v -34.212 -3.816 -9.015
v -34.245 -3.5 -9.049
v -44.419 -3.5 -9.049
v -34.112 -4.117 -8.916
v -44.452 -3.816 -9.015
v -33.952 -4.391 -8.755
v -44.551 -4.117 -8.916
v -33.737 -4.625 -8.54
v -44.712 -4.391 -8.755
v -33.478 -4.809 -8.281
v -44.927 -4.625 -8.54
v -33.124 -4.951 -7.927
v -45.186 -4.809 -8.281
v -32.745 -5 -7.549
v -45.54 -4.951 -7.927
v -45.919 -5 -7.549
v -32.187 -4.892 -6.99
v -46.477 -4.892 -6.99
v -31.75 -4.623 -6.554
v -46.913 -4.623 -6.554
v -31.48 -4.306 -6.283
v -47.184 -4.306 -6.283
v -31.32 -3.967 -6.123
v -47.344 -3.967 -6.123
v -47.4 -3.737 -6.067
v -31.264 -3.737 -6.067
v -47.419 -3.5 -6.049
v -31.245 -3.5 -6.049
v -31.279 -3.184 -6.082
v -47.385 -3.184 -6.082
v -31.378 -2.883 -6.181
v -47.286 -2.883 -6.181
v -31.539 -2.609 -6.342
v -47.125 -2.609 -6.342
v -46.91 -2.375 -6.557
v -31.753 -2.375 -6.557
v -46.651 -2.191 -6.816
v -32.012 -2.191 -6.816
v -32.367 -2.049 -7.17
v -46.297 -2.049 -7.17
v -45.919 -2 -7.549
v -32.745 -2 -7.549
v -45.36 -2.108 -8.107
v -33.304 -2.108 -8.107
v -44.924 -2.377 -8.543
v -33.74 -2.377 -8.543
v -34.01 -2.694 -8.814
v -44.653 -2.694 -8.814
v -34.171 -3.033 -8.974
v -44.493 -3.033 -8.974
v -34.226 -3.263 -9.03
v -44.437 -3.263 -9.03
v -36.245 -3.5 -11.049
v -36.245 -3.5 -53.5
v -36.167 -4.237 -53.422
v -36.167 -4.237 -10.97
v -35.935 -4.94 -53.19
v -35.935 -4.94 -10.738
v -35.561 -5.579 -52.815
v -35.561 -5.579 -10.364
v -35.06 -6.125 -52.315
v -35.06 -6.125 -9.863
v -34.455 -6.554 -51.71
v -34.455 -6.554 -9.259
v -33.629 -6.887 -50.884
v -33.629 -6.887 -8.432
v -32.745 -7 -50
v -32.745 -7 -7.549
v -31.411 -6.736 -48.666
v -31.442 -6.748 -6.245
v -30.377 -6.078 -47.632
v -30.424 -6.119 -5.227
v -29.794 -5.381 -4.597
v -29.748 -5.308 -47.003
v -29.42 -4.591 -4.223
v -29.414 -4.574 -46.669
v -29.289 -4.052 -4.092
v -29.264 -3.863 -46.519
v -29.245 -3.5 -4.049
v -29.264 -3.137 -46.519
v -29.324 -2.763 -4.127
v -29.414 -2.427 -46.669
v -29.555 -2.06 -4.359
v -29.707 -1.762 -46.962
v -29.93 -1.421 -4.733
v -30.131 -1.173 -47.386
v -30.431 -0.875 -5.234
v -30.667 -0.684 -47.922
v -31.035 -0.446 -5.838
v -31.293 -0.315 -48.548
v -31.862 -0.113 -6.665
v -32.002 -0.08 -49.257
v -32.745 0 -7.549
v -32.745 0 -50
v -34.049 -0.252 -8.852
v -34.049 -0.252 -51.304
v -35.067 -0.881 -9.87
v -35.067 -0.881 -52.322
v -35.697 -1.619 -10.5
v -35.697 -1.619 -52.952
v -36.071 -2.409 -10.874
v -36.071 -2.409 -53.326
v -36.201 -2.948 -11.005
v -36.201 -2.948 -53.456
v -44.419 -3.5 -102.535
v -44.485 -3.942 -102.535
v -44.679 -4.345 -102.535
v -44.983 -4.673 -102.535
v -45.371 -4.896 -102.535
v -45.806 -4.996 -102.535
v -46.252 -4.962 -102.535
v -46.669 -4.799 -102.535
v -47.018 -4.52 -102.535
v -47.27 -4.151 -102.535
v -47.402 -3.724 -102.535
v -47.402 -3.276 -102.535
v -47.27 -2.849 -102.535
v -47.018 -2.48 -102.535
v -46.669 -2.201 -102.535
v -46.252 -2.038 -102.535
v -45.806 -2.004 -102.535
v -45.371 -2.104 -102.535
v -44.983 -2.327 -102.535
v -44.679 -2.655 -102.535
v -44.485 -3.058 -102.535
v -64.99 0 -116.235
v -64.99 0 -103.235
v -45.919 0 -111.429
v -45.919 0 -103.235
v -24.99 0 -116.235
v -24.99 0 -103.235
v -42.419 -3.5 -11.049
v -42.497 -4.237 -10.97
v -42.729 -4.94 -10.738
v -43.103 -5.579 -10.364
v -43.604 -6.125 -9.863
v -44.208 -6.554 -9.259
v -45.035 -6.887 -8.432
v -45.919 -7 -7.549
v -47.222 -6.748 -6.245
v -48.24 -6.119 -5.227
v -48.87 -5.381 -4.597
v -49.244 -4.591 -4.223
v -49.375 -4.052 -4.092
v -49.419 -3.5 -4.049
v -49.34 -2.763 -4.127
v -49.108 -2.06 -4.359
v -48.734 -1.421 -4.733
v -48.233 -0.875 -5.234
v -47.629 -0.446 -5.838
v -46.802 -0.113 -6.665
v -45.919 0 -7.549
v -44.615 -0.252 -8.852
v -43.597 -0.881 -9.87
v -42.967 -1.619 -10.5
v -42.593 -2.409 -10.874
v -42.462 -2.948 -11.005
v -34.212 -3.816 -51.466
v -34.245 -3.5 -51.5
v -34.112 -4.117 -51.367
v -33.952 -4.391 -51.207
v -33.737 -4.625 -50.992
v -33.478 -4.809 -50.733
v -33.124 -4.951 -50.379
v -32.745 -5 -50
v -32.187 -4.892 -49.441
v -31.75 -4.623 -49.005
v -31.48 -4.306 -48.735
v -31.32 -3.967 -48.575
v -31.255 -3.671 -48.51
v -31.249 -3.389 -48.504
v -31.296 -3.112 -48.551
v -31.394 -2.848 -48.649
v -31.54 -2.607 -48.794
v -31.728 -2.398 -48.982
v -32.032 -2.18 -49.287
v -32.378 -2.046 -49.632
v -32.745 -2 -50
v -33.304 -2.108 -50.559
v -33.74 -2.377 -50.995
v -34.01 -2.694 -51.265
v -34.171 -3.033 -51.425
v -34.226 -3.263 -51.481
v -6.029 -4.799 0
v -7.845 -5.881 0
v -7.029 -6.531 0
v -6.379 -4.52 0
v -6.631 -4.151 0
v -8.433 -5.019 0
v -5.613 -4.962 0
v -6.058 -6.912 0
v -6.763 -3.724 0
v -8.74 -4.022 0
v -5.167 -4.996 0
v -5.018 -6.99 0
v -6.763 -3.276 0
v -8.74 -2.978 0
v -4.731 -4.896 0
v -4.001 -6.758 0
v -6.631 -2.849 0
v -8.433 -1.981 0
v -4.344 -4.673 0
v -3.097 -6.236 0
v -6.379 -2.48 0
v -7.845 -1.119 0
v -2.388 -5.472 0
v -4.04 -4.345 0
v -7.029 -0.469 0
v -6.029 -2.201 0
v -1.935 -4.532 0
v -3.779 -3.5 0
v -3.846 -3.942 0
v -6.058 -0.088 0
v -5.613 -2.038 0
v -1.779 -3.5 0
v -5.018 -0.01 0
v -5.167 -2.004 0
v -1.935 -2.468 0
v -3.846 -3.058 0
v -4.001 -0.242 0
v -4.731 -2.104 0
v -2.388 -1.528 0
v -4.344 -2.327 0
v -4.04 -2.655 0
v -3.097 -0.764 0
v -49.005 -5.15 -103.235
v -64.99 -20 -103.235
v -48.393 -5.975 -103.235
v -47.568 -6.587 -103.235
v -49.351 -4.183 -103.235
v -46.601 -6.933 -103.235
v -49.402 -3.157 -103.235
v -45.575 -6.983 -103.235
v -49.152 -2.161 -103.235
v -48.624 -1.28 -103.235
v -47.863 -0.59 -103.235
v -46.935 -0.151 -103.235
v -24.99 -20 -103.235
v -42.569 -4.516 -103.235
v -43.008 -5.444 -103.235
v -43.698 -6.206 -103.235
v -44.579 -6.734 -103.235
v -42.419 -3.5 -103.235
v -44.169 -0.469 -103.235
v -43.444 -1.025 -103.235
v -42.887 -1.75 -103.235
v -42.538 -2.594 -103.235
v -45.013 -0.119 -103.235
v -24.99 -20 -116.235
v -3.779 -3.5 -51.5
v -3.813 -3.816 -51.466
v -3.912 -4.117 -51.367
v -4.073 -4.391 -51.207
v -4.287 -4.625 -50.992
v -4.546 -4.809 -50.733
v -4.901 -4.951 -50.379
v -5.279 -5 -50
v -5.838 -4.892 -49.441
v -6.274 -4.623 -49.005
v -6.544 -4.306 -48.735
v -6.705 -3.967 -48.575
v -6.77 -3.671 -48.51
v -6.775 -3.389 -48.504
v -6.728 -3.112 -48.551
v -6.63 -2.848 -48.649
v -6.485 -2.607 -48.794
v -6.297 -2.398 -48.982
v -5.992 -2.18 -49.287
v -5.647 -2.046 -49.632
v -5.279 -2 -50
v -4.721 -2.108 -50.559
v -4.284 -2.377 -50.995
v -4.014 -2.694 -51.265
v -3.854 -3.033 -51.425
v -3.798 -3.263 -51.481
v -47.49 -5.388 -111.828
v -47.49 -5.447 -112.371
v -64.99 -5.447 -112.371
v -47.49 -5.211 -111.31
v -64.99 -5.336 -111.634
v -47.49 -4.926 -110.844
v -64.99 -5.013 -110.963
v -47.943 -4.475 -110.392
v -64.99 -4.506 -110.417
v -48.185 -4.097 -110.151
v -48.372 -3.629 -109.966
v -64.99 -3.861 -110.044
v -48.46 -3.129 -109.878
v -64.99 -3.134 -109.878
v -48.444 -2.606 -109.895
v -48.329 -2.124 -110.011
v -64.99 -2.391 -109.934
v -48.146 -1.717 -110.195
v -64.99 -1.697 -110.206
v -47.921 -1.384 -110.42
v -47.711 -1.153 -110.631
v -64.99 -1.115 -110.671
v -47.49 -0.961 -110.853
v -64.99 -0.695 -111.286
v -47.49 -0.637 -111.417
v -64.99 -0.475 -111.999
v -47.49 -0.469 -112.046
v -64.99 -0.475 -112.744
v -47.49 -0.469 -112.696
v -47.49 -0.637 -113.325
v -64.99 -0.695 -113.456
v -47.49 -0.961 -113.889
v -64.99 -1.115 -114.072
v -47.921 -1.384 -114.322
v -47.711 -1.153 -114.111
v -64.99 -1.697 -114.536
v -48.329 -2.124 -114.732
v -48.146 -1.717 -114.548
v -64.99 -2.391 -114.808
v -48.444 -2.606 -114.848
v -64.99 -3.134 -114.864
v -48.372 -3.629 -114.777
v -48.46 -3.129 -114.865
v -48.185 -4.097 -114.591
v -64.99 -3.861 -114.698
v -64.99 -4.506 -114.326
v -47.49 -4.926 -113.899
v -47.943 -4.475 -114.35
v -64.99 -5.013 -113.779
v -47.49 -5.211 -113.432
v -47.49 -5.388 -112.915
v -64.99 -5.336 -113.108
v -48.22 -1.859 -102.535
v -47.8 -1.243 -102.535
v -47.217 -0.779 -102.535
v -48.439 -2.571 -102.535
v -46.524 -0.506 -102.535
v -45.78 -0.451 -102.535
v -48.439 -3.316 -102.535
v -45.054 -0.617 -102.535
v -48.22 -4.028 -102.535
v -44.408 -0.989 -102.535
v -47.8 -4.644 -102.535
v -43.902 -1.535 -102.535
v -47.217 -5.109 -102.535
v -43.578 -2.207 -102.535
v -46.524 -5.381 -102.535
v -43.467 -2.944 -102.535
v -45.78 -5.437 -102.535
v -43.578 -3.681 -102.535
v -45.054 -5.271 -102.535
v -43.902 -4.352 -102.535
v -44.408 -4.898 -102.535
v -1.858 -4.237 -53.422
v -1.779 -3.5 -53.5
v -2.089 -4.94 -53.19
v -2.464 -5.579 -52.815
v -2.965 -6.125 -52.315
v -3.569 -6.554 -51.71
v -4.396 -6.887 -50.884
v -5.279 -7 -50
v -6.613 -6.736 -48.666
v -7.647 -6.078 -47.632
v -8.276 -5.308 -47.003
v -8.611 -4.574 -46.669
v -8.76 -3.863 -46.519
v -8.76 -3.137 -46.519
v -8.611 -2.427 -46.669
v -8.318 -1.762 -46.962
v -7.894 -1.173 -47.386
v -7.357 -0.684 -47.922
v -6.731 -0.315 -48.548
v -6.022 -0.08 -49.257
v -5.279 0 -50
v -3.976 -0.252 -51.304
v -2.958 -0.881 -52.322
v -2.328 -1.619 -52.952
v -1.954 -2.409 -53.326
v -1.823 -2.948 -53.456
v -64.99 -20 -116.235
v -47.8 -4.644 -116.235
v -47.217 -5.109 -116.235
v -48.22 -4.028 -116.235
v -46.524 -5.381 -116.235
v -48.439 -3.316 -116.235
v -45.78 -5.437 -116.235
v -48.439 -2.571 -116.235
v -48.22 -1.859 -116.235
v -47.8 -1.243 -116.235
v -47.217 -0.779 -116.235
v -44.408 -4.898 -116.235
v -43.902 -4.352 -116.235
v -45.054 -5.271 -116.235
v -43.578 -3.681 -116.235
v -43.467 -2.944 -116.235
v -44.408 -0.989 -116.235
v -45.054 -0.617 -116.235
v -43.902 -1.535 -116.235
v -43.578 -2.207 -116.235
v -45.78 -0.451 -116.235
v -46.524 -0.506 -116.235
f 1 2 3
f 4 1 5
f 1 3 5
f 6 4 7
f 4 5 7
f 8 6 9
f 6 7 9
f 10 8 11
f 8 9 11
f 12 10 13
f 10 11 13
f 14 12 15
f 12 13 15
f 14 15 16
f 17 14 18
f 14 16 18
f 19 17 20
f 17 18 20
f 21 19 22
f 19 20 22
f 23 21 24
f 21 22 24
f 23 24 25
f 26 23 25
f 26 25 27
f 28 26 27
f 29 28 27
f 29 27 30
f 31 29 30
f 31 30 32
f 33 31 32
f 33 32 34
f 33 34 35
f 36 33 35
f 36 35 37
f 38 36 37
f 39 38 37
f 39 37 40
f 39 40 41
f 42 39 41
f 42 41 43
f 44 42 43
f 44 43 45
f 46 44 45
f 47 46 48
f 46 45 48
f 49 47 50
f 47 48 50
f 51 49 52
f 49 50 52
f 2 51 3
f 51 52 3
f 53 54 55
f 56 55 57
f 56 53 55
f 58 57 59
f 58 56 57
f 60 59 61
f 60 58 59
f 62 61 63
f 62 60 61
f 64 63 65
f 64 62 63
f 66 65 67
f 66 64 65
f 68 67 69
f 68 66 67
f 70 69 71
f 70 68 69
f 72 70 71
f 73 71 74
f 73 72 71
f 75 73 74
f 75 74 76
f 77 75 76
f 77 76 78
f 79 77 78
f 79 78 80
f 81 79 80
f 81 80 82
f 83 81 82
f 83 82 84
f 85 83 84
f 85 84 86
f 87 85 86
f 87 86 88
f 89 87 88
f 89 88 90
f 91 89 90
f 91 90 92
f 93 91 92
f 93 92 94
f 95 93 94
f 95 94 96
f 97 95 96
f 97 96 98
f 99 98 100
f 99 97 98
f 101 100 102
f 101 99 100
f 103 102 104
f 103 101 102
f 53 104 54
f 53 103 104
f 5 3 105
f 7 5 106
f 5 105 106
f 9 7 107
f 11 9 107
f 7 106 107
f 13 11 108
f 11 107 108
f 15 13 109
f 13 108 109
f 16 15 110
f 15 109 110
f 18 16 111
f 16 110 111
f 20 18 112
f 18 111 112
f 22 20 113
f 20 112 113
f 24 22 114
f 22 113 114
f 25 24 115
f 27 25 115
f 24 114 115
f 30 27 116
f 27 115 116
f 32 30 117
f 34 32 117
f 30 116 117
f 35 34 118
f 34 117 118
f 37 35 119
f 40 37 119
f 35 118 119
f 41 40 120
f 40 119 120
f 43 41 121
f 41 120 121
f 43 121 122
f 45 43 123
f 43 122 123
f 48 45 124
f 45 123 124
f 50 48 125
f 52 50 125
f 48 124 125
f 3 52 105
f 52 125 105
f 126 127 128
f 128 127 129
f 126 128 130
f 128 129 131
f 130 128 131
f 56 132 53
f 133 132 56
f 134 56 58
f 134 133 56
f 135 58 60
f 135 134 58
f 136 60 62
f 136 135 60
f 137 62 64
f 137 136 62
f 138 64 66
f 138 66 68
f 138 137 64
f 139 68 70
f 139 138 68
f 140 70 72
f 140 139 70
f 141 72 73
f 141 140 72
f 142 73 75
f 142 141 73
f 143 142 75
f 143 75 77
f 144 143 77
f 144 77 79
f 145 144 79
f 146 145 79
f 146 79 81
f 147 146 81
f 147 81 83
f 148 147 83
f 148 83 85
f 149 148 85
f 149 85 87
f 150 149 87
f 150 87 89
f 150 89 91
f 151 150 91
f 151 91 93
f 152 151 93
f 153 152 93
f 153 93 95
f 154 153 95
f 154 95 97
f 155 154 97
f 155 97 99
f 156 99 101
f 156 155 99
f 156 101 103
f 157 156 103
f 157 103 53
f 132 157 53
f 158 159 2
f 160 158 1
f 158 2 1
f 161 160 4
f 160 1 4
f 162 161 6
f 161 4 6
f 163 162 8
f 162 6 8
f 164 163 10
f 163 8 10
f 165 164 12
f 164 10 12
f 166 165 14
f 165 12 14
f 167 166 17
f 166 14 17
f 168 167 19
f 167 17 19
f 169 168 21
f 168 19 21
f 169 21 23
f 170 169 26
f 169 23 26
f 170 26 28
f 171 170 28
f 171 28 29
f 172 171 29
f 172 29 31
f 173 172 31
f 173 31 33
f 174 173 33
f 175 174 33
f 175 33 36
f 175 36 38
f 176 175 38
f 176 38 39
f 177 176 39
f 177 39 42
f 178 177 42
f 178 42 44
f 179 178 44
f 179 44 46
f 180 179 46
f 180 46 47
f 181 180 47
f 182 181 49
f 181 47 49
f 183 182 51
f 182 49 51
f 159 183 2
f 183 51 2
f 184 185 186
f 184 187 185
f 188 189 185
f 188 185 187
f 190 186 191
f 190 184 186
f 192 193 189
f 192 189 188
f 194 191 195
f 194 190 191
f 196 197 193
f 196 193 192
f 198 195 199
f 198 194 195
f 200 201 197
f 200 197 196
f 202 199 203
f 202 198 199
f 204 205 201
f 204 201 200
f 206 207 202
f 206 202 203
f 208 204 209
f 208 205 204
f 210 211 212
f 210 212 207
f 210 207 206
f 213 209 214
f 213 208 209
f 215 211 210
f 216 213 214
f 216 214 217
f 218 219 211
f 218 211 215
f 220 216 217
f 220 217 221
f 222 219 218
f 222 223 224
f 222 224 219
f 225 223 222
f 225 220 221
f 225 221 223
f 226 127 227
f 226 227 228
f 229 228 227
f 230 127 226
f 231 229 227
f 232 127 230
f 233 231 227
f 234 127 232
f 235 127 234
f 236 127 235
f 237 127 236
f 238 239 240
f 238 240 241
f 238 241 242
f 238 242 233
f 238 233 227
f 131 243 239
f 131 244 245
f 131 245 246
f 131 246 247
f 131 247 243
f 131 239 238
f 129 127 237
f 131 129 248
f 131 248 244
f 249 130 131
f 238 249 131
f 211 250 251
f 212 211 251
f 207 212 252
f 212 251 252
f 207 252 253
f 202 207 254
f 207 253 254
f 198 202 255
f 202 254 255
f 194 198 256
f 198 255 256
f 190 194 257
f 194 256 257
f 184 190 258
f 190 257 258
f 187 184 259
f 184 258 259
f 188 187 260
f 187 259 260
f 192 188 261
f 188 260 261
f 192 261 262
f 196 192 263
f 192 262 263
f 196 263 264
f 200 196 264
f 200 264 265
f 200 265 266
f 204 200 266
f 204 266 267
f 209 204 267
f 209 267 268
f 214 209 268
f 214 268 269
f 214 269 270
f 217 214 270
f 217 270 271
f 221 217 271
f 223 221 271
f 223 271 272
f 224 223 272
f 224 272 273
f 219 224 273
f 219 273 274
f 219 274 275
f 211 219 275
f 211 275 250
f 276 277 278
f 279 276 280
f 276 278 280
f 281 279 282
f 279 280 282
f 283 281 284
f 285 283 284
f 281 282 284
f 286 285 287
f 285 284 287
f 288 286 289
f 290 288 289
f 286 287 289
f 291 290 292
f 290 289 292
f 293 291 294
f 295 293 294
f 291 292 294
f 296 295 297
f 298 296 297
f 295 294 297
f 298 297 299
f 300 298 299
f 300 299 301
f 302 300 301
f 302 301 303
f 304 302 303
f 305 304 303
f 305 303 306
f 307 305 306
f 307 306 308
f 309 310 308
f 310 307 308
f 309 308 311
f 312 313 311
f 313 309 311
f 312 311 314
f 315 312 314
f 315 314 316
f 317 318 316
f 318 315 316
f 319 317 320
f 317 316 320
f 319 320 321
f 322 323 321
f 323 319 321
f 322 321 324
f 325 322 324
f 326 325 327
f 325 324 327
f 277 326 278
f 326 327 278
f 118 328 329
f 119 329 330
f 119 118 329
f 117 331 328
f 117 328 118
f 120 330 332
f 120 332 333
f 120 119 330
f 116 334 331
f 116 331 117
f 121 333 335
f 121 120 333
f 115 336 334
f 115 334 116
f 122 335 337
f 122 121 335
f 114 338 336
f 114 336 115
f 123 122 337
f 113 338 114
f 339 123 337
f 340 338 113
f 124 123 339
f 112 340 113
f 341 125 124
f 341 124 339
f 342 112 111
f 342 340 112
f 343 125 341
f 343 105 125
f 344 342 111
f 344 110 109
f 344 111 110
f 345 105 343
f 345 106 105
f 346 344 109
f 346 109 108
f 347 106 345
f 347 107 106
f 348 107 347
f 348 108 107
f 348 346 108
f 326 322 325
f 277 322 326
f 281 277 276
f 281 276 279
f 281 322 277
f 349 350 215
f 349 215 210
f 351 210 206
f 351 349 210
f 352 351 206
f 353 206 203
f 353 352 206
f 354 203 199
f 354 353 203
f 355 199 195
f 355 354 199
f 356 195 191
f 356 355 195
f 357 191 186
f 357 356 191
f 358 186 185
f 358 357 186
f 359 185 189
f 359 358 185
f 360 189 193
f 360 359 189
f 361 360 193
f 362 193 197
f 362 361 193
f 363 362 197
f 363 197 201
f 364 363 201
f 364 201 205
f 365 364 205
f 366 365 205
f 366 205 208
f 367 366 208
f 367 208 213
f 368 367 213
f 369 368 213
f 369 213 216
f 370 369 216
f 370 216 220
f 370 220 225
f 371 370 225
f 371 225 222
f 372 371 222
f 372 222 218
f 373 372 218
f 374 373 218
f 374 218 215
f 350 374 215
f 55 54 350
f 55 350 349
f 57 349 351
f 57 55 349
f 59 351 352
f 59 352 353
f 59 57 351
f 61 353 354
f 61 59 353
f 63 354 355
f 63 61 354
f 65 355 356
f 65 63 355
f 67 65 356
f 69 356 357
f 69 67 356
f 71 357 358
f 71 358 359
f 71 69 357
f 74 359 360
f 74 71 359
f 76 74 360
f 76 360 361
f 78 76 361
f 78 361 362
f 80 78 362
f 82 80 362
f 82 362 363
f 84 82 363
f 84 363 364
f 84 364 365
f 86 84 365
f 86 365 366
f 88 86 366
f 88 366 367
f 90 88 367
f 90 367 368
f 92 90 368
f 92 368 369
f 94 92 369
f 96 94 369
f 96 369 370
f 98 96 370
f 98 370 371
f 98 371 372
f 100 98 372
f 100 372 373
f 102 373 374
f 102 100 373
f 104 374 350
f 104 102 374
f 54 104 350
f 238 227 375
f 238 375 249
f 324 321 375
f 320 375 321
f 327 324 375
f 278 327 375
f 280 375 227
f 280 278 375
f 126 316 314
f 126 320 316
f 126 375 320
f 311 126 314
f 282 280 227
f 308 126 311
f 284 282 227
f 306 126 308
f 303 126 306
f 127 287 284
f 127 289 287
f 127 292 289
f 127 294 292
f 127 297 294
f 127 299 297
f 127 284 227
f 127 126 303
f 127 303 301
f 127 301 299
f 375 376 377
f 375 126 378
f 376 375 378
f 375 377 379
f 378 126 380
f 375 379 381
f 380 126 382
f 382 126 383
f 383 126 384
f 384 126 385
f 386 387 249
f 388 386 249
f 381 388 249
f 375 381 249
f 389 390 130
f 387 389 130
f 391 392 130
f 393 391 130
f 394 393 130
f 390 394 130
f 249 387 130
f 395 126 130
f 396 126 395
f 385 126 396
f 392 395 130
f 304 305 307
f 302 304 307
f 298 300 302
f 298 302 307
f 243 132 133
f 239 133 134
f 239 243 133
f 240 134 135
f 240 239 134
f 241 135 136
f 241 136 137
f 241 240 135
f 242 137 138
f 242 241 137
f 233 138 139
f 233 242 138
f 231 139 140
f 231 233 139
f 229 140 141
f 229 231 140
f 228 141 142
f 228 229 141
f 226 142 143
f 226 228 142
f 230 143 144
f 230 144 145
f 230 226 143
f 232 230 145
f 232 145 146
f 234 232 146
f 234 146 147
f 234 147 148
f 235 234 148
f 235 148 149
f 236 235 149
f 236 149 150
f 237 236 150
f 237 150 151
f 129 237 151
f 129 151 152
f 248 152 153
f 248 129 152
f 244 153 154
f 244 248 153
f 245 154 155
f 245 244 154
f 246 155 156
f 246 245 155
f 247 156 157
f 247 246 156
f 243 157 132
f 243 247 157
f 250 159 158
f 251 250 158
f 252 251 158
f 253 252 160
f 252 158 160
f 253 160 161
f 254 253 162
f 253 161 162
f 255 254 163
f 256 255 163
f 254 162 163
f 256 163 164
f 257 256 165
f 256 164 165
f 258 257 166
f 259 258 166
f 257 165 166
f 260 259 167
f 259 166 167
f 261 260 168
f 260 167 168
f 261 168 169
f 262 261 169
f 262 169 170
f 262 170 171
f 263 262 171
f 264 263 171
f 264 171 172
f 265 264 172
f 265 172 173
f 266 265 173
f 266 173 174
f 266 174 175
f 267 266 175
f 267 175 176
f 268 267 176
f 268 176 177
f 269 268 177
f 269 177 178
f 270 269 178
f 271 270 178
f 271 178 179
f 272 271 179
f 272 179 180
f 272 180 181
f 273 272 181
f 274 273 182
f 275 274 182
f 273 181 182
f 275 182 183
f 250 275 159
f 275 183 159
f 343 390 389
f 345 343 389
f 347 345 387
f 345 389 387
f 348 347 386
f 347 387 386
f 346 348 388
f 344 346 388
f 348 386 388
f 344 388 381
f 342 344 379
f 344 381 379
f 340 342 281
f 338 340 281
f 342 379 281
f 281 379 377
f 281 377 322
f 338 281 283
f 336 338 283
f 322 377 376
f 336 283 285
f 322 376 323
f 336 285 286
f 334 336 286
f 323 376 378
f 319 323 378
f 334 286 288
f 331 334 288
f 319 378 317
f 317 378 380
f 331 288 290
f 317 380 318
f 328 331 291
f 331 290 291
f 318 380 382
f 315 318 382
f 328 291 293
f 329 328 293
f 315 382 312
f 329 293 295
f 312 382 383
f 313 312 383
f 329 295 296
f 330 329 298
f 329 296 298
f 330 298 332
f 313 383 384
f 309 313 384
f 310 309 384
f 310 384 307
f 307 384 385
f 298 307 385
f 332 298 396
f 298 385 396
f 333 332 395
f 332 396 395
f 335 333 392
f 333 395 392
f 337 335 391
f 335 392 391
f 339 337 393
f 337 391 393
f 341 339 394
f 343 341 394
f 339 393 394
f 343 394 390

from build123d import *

# Parameters (mm, degrees)
F1_R     = 3.5
F1_R_2   = 1.5
F4_W     = 40
F4_H     = 13
F5_DEPTH = 20
F6_R     = 2.5
F7_DEPTH = 17.5
F8_R     = 2.5
F9_DEPTH = 13.7


with BuildPart() as f3:
    # F3: sweep along a path in F2
    with BuildLine(Plane.XZ) as f3_path:
        Line((-5.2793398216, 0), (-5.2793398216, -50))
        Line((-5.2793398216, -50), (-32.7452681959, -50))
        Line((-32.7452681959, -50), (-32.7452681959, -7.5485259295))
        Line((-32.7452681959, -7.5485259295), (-45.9185168147, -7.5485259295))
        Line((-45.9185168147, -7.5485259295), (-45.9185168147, -111.4290356636))
    # F1 (on Top) → F3 (sweep)
    with BuildSketch(Plane.XY):
        with Locations((-5.2793398216, -3.5)):
            Circle(F1_R)
        with Locations((-5.2793398216, -3.5)):
            Circle(F1_R_2, mode=Mode.SUBTRACT)
    sweep(path=f3_path.line, transition=Transition.RIGHT)

    # F4 (on face) → F5 (join)
    with BuildSketch(Plane.XZ):
        with Locations((-44.9899062514, -109.7345791803)):
            Rectangle(F4_W, F4_H)
    extrude(amount=F5_DEPTH)

    # F6 (on face) → F7 (cut)
    with BuildSketch(Plane(origin=(-64.9899062514, 0, 0), x_dir=(0, -1, 0), z_dir=(-1, 0, 0))):
        with Locations((2.9474398464, -112.3711525504)):
            Circle(F6_R)
    extrude(amount=-F7_DEPTH, mode=Mode.SUBTRACT)

    # F8 (on face) → F9 (cut)
    with BuildSketch(Plane(origin=(0, 0, -116.2345791803), x_dir=(1, 0, 0), z_dir=(0, 0, -1))):
        with Locations((-45.9672063589, 2.9437162448)):
            Circle(F8_R)
    extrude(amount=-F9_DEPTH, mode=Mode.SUBTRACT)


solid = f3.part
